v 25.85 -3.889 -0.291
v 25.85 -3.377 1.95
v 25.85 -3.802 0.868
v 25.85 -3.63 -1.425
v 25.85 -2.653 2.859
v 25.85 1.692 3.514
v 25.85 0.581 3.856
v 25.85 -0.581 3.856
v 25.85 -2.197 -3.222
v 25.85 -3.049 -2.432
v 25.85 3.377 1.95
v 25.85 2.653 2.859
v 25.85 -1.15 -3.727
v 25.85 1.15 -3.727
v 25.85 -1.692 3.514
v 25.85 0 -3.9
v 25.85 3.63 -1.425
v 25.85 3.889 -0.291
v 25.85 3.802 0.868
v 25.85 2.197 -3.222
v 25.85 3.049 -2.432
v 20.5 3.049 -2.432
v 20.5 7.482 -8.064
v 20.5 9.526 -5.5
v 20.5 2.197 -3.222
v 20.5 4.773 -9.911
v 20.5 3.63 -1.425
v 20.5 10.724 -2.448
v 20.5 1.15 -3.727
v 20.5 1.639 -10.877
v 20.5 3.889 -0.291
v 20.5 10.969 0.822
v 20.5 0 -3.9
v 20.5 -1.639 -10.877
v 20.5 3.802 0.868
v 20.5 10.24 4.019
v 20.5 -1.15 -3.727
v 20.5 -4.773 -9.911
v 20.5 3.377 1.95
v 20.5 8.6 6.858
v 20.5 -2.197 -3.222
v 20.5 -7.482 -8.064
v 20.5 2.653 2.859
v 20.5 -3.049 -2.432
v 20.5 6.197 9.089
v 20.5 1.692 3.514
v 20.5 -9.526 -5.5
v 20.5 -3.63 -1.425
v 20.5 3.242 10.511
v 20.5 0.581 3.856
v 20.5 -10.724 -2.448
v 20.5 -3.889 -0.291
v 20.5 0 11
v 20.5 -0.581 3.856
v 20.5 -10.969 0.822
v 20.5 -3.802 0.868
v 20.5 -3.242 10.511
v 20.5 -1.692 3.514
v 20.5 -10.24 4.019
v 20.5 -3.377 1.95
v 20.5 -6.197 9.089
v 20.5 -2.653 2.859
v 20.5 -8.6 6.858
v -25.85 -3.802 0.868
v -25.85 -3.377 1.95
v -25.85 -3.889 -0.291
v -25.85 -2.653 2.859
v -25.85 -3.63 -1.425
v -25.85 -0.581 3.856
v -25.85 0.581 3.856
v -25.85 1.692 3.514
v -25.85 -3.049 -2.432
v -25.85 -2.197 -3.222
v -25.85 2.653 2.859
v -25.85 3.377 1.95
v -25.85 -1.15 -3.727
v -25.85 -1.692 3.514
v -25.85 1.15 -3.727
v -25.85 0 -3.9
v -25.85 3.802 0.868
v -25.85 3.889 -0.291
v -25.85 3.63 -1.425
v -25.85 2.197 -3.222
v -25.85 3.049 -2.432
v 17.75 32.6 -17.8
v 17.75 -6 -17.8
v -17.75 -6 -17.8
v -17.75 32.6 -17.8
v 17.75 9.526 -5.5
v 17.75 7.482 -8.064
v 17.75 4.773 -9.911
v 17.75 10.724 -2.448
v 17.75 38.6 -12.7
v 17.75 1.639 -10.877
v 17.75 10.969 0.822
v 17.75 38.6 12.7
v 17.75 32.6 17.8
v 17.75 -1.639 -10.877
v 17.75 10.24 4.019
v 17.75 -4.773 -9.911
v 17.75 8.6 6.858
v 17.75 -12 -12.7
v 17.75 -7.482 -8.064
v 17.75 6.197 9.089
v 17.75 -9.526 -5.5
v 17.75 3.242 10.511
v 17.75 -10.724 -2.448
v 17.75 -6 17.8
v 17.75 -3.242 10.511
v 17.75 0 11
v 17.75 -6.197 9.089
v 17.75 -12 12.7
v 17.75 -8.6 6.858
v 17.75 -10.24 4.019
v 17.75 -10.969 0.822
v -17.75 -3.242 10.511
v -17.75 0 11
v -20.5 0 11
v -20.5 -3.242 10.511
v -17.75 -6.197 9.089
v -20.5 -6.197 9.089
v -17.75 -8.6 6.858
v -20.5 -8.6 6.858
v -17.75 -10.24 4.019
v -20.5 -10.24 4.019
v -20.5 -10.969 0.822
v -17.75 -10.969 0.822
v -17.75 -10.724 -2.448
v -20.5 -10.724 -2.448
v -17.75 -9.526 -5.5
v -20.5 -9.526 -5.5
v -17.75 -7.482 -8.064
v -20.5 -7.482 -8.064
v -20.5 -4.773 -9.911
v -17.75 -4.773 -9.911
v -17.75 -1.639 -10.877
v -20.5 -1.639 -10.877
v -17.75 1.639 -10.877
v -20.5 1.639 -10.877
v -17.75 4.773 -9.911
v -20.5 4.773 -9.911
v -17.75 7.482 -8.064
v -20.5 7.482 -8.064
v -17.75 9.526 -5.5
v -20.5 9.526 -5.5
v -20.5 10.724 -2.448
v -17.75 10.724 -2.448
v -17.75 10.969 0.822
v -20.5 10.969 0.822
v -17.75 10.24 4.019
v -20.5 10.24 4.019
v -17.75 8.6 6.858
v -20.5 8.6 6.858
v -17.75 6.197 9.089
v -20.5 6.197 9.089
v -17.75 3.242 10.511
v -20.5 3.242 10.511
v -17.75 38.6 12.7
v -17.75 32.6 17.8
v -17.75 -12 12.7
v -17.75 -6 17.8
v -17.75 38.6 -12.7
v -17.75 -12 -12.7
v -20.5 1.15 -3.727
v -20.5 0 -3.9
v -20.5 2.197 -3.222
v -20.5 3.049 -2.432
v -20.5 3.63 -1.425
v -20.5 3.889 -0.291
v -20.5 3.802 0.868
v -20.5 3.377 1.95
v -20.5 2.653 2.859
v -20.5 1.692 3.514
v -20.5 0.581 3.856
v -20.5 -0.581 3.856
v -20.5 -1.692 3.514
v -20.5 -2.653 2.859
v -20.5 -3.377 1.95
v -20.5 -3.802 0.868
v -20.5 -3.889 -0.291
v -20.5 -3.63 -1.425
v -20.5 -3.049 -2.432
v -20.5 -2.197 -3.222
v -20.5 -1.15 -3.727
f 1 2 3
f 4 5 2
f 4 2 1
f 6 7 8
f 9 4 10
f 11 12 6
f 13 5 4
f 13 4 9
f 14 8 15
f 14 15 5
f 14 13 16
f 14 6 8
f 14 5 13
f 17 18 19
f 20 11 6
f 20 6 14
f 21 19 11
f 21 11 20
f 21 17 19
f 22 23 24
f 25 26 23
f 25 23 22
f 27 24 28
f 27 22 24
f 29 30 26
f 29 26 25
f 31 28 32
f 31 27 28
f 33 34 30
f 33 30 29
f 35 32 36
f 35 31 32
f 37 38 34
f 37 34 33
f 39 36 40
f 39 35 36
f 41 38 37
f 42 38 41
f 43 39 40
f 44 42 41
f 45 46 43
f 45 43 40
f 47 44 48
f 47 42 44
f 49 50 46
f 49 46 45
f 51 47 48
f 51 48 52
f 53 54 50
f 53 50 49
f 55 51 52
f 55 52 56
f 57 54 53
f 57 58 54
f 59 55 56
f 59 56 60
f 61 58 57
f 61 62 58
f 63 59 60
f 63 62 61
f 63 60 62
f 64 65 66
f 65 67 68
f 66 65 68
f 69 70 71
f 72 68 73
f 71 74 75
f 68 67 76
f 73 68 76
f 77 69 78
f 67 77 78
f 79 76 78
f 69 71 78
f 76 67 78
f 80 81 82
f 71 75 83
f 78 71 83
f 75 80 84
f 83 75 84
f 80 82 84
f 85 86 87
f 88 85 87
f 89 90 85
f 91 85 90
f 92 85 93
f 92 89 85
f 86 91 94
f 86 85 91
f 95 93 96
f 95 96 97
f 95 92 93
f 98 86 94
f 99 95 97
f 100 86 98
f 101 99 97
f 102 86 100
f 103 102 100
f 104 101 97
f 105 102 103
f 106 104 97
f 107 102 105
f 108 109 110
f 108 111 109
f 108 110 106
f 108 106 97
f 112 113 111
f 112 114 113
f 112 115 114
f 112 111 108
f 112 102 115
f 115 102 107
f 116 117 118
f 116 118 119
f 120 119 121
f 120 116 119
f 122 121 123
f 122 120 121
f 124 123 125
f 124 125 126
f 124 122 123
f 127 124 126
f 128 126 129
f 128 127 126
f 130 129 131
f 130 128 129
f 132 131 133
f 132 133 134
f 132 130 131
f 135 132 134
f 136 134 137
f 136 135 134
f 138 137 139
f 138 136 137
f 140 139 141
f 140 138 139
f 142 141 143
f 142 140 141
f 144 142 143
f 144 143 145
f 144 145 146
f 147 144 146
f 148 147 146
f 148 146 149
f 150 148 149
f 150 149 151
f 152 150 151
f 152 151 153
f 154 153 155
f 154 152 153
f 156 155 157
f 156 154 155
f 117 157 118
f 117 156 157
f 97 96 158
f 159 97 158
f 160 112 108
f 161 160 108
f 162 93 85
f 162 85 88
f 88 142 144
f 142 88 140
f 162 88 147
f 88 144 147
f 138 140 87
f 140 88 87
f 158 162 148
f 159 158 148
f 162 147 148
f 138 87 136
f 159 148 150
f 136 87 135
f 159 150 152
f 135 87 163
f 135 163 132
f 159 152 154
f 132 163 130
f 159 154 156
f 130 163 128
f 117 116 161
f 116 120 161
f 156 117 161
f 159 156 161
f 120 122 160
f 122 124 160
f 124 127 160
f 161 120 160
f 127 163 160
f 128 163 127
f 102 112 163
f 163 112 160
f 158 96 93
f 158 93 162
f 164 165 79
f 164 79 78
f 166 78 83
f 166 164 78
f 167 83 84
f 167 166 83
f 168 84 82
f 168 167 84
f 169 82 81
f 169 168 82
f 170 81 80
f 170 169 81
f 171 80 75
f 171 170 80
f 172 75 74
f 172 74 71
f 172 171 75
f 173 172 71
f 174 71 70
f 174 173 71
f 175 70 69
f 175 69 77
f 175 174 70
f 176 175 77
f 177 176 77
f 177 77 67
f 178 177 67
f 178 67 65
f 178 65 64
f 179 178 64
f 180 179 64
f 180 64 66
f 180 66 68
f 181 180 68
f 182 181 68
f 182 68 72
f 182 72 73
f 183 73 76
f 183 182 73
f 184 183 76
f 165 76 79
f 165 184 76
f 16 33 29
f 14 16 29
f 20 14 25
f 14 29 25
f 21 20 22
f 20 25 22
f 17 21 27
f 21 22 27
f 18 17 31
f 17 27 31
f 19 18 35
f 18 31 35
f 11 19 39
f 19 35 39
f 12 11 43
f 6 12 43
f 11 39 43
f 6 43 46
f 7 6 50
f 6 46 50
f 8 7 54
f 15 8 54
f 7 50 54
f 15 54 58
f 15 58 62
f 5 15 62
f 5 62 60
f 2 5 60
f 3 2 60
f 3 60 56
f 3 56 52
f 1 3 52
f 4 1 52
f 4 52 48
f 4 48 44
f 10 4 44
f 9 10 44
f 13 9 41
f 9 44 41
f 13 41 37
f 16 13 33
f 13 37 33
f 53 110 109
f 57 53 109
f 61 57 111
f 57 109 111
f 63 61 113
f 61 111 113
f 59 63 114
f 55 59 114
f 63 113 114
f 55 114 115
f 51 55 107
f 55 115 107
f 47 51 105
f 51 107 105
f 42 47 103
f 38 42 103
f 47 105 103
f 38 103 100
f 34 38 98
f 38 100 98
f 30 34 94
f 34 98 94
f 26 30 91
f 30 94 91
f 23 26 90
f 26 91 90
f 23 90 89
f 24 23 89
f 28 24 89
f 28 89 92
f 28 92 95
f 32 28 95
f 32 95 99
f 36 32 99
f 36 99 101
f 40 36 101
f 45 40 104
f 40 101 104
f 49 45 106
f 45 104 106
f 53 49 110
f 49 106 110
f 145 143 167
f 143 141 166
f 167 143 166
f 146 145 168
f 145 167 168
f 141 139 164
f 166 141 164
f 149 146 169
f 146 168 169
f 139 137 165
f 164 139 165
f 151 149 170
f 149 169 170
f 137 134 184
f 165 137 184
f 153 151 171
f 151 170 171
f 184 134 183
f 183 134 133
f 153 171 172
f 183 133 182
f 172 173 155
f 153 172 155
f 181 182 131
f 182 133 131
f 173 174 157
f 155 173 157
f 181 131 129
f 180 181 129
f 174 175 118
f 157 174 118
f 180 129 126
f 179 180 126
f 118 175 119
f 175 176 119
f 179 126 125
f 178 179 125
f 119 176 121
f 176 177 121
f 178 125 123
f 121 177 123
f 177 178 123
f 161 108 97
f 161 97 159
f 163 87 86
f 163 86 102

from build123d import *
from OCP.BRepFilletAPI import BRepFilletAPI_MakeChamfer

# Parameters (mm, degrees)
SKETCH2_W           = 35.5
SKETCH2_H           = 35.6
BOSS_EXTRUDE1_DEPTH = 50.6
SKETCH3_R           = 11
BOSS_EXTRUDE2_DEPTH = 2.75
SKETCH4_R           = 3.9
BOSS_EXTRUDE3_DEPTH = 5.35
CHAMFER1_SIZE       = 6
CHAMFER1_SIZE2      = 5.1
MIRROR3_START       = -17.75
MIRROR3_DEPTH       = 35.5


# Read off the part's stored shape, not the designer's step: Mirror3
with BuildPart() as part:
    # Sketch2 → Boss-Extrude1 (new body)
    with BuildSketch(Plane(origin=(0, -12, 0), x_dir=(-1, 0, 0), z_dir=(0, 1, 0))):
        Rectangle(SKETCH2_W, SKETCH2_H)
    extrude(amount=BOSS_EXTRUDE1_DEPTH)

    # Sketch3 → Boss-Extrude2 (add)
    with BuildSketch(Plane(origin=(17.75, 0, 0), x_dir=(0, 0, -1), z_dir=(1, 0, 0))):
        with Locations(Location((0, 0, 0), (0, 0, 180))):
            Circle(SKETCH3_R)
    boss_extrude2 = extrude(amount=BOSS_EXTRUDE2_DEPTH)

    # Sketch4 → Boss-Extrude3 (add)
    with BuildSketch(Plane(origin=(20.5, 0, 0), x_dir=(0, 0, -1), z_dir=(1, 0, 0))):
        Circle(SKETCH4_R)
    boss_extrude3 = extrude(amount=BOSS_EXTRUDE3_DEPTH)

    # Chamfer1: one chamfer whose edges measure the first distance from different faces: ONE call of the kernel's chamfer builder (chamfer() names one face for all edges)
    chamfer1_edges_1 = [part.edges().sort_by_distance(p)[0] for p in [
        (0, 38.6, -17.8),
    ]]
    chamfer1_side_1 = [part.faces().sort_by_distance(p)[0] for p in [
        (0, 13.3, -17.8),
    ]]
    chamfer1_edges_2 = [part.edges().sort_by_distance(p)[0] for p in [
        (0, 38.6, 17.8),
    ]]
    chamfer1_side_2 = [part.faces().sort_by_distance(p)[0] for p in [
        (0, 13.3, 17.8),
    ]]
    chamfer1 = BRepFilletAPI_MakeChamfer(part.part.solid().wrapped)
    for e in chamfer1_edges_1:
        chamfer1.Add(CHAMFER1_SIZE, CHAMFER1_SIZE2, e.wrapped, chamfer1_side_1[0].wrapped)  # the first distance lies on this face
    for e in chamfer1_edges_2:
        chamfer1.Add(CHAMFER1_SIZE, CHAMFER1_SIZE2, e.wrapped, chamfer1_side_2[0].wrapped)  # the first distance lies on this face
    add(Compound.cast(chamfer1.Shape()), mode=Mode.REPLACE)

    # Mirror1: Boss-Extrude2, Boss-Extrude3 across plane
    add(boss_extrude2.mirror(Plane(origin=(0, 0, 0), x_dir=(0, 0, 1), z_dir=(1, 0, 0))))
    add(boss_extrude3.mirror(Plane(origin=(0, 0, 0), x_dir=(0, 0, 1), z_dir=(1, 0, 0))))

    # Mirror3 outline → Mirror3 (cut)
    with BuildSketch(Plane.YZ.offset(MIRROR3_START)):
        Polygon((-6, -17.8), (-12, -12.7), (-12, -17.8), align=None)
        Polygon((-12, 12.7), (-6, 17.8), (-12, 17.8), align=None)
    extrude(amount=MIRROR3_DEPTH, mode=Mode.SUBTRACT)


solid = part.part
